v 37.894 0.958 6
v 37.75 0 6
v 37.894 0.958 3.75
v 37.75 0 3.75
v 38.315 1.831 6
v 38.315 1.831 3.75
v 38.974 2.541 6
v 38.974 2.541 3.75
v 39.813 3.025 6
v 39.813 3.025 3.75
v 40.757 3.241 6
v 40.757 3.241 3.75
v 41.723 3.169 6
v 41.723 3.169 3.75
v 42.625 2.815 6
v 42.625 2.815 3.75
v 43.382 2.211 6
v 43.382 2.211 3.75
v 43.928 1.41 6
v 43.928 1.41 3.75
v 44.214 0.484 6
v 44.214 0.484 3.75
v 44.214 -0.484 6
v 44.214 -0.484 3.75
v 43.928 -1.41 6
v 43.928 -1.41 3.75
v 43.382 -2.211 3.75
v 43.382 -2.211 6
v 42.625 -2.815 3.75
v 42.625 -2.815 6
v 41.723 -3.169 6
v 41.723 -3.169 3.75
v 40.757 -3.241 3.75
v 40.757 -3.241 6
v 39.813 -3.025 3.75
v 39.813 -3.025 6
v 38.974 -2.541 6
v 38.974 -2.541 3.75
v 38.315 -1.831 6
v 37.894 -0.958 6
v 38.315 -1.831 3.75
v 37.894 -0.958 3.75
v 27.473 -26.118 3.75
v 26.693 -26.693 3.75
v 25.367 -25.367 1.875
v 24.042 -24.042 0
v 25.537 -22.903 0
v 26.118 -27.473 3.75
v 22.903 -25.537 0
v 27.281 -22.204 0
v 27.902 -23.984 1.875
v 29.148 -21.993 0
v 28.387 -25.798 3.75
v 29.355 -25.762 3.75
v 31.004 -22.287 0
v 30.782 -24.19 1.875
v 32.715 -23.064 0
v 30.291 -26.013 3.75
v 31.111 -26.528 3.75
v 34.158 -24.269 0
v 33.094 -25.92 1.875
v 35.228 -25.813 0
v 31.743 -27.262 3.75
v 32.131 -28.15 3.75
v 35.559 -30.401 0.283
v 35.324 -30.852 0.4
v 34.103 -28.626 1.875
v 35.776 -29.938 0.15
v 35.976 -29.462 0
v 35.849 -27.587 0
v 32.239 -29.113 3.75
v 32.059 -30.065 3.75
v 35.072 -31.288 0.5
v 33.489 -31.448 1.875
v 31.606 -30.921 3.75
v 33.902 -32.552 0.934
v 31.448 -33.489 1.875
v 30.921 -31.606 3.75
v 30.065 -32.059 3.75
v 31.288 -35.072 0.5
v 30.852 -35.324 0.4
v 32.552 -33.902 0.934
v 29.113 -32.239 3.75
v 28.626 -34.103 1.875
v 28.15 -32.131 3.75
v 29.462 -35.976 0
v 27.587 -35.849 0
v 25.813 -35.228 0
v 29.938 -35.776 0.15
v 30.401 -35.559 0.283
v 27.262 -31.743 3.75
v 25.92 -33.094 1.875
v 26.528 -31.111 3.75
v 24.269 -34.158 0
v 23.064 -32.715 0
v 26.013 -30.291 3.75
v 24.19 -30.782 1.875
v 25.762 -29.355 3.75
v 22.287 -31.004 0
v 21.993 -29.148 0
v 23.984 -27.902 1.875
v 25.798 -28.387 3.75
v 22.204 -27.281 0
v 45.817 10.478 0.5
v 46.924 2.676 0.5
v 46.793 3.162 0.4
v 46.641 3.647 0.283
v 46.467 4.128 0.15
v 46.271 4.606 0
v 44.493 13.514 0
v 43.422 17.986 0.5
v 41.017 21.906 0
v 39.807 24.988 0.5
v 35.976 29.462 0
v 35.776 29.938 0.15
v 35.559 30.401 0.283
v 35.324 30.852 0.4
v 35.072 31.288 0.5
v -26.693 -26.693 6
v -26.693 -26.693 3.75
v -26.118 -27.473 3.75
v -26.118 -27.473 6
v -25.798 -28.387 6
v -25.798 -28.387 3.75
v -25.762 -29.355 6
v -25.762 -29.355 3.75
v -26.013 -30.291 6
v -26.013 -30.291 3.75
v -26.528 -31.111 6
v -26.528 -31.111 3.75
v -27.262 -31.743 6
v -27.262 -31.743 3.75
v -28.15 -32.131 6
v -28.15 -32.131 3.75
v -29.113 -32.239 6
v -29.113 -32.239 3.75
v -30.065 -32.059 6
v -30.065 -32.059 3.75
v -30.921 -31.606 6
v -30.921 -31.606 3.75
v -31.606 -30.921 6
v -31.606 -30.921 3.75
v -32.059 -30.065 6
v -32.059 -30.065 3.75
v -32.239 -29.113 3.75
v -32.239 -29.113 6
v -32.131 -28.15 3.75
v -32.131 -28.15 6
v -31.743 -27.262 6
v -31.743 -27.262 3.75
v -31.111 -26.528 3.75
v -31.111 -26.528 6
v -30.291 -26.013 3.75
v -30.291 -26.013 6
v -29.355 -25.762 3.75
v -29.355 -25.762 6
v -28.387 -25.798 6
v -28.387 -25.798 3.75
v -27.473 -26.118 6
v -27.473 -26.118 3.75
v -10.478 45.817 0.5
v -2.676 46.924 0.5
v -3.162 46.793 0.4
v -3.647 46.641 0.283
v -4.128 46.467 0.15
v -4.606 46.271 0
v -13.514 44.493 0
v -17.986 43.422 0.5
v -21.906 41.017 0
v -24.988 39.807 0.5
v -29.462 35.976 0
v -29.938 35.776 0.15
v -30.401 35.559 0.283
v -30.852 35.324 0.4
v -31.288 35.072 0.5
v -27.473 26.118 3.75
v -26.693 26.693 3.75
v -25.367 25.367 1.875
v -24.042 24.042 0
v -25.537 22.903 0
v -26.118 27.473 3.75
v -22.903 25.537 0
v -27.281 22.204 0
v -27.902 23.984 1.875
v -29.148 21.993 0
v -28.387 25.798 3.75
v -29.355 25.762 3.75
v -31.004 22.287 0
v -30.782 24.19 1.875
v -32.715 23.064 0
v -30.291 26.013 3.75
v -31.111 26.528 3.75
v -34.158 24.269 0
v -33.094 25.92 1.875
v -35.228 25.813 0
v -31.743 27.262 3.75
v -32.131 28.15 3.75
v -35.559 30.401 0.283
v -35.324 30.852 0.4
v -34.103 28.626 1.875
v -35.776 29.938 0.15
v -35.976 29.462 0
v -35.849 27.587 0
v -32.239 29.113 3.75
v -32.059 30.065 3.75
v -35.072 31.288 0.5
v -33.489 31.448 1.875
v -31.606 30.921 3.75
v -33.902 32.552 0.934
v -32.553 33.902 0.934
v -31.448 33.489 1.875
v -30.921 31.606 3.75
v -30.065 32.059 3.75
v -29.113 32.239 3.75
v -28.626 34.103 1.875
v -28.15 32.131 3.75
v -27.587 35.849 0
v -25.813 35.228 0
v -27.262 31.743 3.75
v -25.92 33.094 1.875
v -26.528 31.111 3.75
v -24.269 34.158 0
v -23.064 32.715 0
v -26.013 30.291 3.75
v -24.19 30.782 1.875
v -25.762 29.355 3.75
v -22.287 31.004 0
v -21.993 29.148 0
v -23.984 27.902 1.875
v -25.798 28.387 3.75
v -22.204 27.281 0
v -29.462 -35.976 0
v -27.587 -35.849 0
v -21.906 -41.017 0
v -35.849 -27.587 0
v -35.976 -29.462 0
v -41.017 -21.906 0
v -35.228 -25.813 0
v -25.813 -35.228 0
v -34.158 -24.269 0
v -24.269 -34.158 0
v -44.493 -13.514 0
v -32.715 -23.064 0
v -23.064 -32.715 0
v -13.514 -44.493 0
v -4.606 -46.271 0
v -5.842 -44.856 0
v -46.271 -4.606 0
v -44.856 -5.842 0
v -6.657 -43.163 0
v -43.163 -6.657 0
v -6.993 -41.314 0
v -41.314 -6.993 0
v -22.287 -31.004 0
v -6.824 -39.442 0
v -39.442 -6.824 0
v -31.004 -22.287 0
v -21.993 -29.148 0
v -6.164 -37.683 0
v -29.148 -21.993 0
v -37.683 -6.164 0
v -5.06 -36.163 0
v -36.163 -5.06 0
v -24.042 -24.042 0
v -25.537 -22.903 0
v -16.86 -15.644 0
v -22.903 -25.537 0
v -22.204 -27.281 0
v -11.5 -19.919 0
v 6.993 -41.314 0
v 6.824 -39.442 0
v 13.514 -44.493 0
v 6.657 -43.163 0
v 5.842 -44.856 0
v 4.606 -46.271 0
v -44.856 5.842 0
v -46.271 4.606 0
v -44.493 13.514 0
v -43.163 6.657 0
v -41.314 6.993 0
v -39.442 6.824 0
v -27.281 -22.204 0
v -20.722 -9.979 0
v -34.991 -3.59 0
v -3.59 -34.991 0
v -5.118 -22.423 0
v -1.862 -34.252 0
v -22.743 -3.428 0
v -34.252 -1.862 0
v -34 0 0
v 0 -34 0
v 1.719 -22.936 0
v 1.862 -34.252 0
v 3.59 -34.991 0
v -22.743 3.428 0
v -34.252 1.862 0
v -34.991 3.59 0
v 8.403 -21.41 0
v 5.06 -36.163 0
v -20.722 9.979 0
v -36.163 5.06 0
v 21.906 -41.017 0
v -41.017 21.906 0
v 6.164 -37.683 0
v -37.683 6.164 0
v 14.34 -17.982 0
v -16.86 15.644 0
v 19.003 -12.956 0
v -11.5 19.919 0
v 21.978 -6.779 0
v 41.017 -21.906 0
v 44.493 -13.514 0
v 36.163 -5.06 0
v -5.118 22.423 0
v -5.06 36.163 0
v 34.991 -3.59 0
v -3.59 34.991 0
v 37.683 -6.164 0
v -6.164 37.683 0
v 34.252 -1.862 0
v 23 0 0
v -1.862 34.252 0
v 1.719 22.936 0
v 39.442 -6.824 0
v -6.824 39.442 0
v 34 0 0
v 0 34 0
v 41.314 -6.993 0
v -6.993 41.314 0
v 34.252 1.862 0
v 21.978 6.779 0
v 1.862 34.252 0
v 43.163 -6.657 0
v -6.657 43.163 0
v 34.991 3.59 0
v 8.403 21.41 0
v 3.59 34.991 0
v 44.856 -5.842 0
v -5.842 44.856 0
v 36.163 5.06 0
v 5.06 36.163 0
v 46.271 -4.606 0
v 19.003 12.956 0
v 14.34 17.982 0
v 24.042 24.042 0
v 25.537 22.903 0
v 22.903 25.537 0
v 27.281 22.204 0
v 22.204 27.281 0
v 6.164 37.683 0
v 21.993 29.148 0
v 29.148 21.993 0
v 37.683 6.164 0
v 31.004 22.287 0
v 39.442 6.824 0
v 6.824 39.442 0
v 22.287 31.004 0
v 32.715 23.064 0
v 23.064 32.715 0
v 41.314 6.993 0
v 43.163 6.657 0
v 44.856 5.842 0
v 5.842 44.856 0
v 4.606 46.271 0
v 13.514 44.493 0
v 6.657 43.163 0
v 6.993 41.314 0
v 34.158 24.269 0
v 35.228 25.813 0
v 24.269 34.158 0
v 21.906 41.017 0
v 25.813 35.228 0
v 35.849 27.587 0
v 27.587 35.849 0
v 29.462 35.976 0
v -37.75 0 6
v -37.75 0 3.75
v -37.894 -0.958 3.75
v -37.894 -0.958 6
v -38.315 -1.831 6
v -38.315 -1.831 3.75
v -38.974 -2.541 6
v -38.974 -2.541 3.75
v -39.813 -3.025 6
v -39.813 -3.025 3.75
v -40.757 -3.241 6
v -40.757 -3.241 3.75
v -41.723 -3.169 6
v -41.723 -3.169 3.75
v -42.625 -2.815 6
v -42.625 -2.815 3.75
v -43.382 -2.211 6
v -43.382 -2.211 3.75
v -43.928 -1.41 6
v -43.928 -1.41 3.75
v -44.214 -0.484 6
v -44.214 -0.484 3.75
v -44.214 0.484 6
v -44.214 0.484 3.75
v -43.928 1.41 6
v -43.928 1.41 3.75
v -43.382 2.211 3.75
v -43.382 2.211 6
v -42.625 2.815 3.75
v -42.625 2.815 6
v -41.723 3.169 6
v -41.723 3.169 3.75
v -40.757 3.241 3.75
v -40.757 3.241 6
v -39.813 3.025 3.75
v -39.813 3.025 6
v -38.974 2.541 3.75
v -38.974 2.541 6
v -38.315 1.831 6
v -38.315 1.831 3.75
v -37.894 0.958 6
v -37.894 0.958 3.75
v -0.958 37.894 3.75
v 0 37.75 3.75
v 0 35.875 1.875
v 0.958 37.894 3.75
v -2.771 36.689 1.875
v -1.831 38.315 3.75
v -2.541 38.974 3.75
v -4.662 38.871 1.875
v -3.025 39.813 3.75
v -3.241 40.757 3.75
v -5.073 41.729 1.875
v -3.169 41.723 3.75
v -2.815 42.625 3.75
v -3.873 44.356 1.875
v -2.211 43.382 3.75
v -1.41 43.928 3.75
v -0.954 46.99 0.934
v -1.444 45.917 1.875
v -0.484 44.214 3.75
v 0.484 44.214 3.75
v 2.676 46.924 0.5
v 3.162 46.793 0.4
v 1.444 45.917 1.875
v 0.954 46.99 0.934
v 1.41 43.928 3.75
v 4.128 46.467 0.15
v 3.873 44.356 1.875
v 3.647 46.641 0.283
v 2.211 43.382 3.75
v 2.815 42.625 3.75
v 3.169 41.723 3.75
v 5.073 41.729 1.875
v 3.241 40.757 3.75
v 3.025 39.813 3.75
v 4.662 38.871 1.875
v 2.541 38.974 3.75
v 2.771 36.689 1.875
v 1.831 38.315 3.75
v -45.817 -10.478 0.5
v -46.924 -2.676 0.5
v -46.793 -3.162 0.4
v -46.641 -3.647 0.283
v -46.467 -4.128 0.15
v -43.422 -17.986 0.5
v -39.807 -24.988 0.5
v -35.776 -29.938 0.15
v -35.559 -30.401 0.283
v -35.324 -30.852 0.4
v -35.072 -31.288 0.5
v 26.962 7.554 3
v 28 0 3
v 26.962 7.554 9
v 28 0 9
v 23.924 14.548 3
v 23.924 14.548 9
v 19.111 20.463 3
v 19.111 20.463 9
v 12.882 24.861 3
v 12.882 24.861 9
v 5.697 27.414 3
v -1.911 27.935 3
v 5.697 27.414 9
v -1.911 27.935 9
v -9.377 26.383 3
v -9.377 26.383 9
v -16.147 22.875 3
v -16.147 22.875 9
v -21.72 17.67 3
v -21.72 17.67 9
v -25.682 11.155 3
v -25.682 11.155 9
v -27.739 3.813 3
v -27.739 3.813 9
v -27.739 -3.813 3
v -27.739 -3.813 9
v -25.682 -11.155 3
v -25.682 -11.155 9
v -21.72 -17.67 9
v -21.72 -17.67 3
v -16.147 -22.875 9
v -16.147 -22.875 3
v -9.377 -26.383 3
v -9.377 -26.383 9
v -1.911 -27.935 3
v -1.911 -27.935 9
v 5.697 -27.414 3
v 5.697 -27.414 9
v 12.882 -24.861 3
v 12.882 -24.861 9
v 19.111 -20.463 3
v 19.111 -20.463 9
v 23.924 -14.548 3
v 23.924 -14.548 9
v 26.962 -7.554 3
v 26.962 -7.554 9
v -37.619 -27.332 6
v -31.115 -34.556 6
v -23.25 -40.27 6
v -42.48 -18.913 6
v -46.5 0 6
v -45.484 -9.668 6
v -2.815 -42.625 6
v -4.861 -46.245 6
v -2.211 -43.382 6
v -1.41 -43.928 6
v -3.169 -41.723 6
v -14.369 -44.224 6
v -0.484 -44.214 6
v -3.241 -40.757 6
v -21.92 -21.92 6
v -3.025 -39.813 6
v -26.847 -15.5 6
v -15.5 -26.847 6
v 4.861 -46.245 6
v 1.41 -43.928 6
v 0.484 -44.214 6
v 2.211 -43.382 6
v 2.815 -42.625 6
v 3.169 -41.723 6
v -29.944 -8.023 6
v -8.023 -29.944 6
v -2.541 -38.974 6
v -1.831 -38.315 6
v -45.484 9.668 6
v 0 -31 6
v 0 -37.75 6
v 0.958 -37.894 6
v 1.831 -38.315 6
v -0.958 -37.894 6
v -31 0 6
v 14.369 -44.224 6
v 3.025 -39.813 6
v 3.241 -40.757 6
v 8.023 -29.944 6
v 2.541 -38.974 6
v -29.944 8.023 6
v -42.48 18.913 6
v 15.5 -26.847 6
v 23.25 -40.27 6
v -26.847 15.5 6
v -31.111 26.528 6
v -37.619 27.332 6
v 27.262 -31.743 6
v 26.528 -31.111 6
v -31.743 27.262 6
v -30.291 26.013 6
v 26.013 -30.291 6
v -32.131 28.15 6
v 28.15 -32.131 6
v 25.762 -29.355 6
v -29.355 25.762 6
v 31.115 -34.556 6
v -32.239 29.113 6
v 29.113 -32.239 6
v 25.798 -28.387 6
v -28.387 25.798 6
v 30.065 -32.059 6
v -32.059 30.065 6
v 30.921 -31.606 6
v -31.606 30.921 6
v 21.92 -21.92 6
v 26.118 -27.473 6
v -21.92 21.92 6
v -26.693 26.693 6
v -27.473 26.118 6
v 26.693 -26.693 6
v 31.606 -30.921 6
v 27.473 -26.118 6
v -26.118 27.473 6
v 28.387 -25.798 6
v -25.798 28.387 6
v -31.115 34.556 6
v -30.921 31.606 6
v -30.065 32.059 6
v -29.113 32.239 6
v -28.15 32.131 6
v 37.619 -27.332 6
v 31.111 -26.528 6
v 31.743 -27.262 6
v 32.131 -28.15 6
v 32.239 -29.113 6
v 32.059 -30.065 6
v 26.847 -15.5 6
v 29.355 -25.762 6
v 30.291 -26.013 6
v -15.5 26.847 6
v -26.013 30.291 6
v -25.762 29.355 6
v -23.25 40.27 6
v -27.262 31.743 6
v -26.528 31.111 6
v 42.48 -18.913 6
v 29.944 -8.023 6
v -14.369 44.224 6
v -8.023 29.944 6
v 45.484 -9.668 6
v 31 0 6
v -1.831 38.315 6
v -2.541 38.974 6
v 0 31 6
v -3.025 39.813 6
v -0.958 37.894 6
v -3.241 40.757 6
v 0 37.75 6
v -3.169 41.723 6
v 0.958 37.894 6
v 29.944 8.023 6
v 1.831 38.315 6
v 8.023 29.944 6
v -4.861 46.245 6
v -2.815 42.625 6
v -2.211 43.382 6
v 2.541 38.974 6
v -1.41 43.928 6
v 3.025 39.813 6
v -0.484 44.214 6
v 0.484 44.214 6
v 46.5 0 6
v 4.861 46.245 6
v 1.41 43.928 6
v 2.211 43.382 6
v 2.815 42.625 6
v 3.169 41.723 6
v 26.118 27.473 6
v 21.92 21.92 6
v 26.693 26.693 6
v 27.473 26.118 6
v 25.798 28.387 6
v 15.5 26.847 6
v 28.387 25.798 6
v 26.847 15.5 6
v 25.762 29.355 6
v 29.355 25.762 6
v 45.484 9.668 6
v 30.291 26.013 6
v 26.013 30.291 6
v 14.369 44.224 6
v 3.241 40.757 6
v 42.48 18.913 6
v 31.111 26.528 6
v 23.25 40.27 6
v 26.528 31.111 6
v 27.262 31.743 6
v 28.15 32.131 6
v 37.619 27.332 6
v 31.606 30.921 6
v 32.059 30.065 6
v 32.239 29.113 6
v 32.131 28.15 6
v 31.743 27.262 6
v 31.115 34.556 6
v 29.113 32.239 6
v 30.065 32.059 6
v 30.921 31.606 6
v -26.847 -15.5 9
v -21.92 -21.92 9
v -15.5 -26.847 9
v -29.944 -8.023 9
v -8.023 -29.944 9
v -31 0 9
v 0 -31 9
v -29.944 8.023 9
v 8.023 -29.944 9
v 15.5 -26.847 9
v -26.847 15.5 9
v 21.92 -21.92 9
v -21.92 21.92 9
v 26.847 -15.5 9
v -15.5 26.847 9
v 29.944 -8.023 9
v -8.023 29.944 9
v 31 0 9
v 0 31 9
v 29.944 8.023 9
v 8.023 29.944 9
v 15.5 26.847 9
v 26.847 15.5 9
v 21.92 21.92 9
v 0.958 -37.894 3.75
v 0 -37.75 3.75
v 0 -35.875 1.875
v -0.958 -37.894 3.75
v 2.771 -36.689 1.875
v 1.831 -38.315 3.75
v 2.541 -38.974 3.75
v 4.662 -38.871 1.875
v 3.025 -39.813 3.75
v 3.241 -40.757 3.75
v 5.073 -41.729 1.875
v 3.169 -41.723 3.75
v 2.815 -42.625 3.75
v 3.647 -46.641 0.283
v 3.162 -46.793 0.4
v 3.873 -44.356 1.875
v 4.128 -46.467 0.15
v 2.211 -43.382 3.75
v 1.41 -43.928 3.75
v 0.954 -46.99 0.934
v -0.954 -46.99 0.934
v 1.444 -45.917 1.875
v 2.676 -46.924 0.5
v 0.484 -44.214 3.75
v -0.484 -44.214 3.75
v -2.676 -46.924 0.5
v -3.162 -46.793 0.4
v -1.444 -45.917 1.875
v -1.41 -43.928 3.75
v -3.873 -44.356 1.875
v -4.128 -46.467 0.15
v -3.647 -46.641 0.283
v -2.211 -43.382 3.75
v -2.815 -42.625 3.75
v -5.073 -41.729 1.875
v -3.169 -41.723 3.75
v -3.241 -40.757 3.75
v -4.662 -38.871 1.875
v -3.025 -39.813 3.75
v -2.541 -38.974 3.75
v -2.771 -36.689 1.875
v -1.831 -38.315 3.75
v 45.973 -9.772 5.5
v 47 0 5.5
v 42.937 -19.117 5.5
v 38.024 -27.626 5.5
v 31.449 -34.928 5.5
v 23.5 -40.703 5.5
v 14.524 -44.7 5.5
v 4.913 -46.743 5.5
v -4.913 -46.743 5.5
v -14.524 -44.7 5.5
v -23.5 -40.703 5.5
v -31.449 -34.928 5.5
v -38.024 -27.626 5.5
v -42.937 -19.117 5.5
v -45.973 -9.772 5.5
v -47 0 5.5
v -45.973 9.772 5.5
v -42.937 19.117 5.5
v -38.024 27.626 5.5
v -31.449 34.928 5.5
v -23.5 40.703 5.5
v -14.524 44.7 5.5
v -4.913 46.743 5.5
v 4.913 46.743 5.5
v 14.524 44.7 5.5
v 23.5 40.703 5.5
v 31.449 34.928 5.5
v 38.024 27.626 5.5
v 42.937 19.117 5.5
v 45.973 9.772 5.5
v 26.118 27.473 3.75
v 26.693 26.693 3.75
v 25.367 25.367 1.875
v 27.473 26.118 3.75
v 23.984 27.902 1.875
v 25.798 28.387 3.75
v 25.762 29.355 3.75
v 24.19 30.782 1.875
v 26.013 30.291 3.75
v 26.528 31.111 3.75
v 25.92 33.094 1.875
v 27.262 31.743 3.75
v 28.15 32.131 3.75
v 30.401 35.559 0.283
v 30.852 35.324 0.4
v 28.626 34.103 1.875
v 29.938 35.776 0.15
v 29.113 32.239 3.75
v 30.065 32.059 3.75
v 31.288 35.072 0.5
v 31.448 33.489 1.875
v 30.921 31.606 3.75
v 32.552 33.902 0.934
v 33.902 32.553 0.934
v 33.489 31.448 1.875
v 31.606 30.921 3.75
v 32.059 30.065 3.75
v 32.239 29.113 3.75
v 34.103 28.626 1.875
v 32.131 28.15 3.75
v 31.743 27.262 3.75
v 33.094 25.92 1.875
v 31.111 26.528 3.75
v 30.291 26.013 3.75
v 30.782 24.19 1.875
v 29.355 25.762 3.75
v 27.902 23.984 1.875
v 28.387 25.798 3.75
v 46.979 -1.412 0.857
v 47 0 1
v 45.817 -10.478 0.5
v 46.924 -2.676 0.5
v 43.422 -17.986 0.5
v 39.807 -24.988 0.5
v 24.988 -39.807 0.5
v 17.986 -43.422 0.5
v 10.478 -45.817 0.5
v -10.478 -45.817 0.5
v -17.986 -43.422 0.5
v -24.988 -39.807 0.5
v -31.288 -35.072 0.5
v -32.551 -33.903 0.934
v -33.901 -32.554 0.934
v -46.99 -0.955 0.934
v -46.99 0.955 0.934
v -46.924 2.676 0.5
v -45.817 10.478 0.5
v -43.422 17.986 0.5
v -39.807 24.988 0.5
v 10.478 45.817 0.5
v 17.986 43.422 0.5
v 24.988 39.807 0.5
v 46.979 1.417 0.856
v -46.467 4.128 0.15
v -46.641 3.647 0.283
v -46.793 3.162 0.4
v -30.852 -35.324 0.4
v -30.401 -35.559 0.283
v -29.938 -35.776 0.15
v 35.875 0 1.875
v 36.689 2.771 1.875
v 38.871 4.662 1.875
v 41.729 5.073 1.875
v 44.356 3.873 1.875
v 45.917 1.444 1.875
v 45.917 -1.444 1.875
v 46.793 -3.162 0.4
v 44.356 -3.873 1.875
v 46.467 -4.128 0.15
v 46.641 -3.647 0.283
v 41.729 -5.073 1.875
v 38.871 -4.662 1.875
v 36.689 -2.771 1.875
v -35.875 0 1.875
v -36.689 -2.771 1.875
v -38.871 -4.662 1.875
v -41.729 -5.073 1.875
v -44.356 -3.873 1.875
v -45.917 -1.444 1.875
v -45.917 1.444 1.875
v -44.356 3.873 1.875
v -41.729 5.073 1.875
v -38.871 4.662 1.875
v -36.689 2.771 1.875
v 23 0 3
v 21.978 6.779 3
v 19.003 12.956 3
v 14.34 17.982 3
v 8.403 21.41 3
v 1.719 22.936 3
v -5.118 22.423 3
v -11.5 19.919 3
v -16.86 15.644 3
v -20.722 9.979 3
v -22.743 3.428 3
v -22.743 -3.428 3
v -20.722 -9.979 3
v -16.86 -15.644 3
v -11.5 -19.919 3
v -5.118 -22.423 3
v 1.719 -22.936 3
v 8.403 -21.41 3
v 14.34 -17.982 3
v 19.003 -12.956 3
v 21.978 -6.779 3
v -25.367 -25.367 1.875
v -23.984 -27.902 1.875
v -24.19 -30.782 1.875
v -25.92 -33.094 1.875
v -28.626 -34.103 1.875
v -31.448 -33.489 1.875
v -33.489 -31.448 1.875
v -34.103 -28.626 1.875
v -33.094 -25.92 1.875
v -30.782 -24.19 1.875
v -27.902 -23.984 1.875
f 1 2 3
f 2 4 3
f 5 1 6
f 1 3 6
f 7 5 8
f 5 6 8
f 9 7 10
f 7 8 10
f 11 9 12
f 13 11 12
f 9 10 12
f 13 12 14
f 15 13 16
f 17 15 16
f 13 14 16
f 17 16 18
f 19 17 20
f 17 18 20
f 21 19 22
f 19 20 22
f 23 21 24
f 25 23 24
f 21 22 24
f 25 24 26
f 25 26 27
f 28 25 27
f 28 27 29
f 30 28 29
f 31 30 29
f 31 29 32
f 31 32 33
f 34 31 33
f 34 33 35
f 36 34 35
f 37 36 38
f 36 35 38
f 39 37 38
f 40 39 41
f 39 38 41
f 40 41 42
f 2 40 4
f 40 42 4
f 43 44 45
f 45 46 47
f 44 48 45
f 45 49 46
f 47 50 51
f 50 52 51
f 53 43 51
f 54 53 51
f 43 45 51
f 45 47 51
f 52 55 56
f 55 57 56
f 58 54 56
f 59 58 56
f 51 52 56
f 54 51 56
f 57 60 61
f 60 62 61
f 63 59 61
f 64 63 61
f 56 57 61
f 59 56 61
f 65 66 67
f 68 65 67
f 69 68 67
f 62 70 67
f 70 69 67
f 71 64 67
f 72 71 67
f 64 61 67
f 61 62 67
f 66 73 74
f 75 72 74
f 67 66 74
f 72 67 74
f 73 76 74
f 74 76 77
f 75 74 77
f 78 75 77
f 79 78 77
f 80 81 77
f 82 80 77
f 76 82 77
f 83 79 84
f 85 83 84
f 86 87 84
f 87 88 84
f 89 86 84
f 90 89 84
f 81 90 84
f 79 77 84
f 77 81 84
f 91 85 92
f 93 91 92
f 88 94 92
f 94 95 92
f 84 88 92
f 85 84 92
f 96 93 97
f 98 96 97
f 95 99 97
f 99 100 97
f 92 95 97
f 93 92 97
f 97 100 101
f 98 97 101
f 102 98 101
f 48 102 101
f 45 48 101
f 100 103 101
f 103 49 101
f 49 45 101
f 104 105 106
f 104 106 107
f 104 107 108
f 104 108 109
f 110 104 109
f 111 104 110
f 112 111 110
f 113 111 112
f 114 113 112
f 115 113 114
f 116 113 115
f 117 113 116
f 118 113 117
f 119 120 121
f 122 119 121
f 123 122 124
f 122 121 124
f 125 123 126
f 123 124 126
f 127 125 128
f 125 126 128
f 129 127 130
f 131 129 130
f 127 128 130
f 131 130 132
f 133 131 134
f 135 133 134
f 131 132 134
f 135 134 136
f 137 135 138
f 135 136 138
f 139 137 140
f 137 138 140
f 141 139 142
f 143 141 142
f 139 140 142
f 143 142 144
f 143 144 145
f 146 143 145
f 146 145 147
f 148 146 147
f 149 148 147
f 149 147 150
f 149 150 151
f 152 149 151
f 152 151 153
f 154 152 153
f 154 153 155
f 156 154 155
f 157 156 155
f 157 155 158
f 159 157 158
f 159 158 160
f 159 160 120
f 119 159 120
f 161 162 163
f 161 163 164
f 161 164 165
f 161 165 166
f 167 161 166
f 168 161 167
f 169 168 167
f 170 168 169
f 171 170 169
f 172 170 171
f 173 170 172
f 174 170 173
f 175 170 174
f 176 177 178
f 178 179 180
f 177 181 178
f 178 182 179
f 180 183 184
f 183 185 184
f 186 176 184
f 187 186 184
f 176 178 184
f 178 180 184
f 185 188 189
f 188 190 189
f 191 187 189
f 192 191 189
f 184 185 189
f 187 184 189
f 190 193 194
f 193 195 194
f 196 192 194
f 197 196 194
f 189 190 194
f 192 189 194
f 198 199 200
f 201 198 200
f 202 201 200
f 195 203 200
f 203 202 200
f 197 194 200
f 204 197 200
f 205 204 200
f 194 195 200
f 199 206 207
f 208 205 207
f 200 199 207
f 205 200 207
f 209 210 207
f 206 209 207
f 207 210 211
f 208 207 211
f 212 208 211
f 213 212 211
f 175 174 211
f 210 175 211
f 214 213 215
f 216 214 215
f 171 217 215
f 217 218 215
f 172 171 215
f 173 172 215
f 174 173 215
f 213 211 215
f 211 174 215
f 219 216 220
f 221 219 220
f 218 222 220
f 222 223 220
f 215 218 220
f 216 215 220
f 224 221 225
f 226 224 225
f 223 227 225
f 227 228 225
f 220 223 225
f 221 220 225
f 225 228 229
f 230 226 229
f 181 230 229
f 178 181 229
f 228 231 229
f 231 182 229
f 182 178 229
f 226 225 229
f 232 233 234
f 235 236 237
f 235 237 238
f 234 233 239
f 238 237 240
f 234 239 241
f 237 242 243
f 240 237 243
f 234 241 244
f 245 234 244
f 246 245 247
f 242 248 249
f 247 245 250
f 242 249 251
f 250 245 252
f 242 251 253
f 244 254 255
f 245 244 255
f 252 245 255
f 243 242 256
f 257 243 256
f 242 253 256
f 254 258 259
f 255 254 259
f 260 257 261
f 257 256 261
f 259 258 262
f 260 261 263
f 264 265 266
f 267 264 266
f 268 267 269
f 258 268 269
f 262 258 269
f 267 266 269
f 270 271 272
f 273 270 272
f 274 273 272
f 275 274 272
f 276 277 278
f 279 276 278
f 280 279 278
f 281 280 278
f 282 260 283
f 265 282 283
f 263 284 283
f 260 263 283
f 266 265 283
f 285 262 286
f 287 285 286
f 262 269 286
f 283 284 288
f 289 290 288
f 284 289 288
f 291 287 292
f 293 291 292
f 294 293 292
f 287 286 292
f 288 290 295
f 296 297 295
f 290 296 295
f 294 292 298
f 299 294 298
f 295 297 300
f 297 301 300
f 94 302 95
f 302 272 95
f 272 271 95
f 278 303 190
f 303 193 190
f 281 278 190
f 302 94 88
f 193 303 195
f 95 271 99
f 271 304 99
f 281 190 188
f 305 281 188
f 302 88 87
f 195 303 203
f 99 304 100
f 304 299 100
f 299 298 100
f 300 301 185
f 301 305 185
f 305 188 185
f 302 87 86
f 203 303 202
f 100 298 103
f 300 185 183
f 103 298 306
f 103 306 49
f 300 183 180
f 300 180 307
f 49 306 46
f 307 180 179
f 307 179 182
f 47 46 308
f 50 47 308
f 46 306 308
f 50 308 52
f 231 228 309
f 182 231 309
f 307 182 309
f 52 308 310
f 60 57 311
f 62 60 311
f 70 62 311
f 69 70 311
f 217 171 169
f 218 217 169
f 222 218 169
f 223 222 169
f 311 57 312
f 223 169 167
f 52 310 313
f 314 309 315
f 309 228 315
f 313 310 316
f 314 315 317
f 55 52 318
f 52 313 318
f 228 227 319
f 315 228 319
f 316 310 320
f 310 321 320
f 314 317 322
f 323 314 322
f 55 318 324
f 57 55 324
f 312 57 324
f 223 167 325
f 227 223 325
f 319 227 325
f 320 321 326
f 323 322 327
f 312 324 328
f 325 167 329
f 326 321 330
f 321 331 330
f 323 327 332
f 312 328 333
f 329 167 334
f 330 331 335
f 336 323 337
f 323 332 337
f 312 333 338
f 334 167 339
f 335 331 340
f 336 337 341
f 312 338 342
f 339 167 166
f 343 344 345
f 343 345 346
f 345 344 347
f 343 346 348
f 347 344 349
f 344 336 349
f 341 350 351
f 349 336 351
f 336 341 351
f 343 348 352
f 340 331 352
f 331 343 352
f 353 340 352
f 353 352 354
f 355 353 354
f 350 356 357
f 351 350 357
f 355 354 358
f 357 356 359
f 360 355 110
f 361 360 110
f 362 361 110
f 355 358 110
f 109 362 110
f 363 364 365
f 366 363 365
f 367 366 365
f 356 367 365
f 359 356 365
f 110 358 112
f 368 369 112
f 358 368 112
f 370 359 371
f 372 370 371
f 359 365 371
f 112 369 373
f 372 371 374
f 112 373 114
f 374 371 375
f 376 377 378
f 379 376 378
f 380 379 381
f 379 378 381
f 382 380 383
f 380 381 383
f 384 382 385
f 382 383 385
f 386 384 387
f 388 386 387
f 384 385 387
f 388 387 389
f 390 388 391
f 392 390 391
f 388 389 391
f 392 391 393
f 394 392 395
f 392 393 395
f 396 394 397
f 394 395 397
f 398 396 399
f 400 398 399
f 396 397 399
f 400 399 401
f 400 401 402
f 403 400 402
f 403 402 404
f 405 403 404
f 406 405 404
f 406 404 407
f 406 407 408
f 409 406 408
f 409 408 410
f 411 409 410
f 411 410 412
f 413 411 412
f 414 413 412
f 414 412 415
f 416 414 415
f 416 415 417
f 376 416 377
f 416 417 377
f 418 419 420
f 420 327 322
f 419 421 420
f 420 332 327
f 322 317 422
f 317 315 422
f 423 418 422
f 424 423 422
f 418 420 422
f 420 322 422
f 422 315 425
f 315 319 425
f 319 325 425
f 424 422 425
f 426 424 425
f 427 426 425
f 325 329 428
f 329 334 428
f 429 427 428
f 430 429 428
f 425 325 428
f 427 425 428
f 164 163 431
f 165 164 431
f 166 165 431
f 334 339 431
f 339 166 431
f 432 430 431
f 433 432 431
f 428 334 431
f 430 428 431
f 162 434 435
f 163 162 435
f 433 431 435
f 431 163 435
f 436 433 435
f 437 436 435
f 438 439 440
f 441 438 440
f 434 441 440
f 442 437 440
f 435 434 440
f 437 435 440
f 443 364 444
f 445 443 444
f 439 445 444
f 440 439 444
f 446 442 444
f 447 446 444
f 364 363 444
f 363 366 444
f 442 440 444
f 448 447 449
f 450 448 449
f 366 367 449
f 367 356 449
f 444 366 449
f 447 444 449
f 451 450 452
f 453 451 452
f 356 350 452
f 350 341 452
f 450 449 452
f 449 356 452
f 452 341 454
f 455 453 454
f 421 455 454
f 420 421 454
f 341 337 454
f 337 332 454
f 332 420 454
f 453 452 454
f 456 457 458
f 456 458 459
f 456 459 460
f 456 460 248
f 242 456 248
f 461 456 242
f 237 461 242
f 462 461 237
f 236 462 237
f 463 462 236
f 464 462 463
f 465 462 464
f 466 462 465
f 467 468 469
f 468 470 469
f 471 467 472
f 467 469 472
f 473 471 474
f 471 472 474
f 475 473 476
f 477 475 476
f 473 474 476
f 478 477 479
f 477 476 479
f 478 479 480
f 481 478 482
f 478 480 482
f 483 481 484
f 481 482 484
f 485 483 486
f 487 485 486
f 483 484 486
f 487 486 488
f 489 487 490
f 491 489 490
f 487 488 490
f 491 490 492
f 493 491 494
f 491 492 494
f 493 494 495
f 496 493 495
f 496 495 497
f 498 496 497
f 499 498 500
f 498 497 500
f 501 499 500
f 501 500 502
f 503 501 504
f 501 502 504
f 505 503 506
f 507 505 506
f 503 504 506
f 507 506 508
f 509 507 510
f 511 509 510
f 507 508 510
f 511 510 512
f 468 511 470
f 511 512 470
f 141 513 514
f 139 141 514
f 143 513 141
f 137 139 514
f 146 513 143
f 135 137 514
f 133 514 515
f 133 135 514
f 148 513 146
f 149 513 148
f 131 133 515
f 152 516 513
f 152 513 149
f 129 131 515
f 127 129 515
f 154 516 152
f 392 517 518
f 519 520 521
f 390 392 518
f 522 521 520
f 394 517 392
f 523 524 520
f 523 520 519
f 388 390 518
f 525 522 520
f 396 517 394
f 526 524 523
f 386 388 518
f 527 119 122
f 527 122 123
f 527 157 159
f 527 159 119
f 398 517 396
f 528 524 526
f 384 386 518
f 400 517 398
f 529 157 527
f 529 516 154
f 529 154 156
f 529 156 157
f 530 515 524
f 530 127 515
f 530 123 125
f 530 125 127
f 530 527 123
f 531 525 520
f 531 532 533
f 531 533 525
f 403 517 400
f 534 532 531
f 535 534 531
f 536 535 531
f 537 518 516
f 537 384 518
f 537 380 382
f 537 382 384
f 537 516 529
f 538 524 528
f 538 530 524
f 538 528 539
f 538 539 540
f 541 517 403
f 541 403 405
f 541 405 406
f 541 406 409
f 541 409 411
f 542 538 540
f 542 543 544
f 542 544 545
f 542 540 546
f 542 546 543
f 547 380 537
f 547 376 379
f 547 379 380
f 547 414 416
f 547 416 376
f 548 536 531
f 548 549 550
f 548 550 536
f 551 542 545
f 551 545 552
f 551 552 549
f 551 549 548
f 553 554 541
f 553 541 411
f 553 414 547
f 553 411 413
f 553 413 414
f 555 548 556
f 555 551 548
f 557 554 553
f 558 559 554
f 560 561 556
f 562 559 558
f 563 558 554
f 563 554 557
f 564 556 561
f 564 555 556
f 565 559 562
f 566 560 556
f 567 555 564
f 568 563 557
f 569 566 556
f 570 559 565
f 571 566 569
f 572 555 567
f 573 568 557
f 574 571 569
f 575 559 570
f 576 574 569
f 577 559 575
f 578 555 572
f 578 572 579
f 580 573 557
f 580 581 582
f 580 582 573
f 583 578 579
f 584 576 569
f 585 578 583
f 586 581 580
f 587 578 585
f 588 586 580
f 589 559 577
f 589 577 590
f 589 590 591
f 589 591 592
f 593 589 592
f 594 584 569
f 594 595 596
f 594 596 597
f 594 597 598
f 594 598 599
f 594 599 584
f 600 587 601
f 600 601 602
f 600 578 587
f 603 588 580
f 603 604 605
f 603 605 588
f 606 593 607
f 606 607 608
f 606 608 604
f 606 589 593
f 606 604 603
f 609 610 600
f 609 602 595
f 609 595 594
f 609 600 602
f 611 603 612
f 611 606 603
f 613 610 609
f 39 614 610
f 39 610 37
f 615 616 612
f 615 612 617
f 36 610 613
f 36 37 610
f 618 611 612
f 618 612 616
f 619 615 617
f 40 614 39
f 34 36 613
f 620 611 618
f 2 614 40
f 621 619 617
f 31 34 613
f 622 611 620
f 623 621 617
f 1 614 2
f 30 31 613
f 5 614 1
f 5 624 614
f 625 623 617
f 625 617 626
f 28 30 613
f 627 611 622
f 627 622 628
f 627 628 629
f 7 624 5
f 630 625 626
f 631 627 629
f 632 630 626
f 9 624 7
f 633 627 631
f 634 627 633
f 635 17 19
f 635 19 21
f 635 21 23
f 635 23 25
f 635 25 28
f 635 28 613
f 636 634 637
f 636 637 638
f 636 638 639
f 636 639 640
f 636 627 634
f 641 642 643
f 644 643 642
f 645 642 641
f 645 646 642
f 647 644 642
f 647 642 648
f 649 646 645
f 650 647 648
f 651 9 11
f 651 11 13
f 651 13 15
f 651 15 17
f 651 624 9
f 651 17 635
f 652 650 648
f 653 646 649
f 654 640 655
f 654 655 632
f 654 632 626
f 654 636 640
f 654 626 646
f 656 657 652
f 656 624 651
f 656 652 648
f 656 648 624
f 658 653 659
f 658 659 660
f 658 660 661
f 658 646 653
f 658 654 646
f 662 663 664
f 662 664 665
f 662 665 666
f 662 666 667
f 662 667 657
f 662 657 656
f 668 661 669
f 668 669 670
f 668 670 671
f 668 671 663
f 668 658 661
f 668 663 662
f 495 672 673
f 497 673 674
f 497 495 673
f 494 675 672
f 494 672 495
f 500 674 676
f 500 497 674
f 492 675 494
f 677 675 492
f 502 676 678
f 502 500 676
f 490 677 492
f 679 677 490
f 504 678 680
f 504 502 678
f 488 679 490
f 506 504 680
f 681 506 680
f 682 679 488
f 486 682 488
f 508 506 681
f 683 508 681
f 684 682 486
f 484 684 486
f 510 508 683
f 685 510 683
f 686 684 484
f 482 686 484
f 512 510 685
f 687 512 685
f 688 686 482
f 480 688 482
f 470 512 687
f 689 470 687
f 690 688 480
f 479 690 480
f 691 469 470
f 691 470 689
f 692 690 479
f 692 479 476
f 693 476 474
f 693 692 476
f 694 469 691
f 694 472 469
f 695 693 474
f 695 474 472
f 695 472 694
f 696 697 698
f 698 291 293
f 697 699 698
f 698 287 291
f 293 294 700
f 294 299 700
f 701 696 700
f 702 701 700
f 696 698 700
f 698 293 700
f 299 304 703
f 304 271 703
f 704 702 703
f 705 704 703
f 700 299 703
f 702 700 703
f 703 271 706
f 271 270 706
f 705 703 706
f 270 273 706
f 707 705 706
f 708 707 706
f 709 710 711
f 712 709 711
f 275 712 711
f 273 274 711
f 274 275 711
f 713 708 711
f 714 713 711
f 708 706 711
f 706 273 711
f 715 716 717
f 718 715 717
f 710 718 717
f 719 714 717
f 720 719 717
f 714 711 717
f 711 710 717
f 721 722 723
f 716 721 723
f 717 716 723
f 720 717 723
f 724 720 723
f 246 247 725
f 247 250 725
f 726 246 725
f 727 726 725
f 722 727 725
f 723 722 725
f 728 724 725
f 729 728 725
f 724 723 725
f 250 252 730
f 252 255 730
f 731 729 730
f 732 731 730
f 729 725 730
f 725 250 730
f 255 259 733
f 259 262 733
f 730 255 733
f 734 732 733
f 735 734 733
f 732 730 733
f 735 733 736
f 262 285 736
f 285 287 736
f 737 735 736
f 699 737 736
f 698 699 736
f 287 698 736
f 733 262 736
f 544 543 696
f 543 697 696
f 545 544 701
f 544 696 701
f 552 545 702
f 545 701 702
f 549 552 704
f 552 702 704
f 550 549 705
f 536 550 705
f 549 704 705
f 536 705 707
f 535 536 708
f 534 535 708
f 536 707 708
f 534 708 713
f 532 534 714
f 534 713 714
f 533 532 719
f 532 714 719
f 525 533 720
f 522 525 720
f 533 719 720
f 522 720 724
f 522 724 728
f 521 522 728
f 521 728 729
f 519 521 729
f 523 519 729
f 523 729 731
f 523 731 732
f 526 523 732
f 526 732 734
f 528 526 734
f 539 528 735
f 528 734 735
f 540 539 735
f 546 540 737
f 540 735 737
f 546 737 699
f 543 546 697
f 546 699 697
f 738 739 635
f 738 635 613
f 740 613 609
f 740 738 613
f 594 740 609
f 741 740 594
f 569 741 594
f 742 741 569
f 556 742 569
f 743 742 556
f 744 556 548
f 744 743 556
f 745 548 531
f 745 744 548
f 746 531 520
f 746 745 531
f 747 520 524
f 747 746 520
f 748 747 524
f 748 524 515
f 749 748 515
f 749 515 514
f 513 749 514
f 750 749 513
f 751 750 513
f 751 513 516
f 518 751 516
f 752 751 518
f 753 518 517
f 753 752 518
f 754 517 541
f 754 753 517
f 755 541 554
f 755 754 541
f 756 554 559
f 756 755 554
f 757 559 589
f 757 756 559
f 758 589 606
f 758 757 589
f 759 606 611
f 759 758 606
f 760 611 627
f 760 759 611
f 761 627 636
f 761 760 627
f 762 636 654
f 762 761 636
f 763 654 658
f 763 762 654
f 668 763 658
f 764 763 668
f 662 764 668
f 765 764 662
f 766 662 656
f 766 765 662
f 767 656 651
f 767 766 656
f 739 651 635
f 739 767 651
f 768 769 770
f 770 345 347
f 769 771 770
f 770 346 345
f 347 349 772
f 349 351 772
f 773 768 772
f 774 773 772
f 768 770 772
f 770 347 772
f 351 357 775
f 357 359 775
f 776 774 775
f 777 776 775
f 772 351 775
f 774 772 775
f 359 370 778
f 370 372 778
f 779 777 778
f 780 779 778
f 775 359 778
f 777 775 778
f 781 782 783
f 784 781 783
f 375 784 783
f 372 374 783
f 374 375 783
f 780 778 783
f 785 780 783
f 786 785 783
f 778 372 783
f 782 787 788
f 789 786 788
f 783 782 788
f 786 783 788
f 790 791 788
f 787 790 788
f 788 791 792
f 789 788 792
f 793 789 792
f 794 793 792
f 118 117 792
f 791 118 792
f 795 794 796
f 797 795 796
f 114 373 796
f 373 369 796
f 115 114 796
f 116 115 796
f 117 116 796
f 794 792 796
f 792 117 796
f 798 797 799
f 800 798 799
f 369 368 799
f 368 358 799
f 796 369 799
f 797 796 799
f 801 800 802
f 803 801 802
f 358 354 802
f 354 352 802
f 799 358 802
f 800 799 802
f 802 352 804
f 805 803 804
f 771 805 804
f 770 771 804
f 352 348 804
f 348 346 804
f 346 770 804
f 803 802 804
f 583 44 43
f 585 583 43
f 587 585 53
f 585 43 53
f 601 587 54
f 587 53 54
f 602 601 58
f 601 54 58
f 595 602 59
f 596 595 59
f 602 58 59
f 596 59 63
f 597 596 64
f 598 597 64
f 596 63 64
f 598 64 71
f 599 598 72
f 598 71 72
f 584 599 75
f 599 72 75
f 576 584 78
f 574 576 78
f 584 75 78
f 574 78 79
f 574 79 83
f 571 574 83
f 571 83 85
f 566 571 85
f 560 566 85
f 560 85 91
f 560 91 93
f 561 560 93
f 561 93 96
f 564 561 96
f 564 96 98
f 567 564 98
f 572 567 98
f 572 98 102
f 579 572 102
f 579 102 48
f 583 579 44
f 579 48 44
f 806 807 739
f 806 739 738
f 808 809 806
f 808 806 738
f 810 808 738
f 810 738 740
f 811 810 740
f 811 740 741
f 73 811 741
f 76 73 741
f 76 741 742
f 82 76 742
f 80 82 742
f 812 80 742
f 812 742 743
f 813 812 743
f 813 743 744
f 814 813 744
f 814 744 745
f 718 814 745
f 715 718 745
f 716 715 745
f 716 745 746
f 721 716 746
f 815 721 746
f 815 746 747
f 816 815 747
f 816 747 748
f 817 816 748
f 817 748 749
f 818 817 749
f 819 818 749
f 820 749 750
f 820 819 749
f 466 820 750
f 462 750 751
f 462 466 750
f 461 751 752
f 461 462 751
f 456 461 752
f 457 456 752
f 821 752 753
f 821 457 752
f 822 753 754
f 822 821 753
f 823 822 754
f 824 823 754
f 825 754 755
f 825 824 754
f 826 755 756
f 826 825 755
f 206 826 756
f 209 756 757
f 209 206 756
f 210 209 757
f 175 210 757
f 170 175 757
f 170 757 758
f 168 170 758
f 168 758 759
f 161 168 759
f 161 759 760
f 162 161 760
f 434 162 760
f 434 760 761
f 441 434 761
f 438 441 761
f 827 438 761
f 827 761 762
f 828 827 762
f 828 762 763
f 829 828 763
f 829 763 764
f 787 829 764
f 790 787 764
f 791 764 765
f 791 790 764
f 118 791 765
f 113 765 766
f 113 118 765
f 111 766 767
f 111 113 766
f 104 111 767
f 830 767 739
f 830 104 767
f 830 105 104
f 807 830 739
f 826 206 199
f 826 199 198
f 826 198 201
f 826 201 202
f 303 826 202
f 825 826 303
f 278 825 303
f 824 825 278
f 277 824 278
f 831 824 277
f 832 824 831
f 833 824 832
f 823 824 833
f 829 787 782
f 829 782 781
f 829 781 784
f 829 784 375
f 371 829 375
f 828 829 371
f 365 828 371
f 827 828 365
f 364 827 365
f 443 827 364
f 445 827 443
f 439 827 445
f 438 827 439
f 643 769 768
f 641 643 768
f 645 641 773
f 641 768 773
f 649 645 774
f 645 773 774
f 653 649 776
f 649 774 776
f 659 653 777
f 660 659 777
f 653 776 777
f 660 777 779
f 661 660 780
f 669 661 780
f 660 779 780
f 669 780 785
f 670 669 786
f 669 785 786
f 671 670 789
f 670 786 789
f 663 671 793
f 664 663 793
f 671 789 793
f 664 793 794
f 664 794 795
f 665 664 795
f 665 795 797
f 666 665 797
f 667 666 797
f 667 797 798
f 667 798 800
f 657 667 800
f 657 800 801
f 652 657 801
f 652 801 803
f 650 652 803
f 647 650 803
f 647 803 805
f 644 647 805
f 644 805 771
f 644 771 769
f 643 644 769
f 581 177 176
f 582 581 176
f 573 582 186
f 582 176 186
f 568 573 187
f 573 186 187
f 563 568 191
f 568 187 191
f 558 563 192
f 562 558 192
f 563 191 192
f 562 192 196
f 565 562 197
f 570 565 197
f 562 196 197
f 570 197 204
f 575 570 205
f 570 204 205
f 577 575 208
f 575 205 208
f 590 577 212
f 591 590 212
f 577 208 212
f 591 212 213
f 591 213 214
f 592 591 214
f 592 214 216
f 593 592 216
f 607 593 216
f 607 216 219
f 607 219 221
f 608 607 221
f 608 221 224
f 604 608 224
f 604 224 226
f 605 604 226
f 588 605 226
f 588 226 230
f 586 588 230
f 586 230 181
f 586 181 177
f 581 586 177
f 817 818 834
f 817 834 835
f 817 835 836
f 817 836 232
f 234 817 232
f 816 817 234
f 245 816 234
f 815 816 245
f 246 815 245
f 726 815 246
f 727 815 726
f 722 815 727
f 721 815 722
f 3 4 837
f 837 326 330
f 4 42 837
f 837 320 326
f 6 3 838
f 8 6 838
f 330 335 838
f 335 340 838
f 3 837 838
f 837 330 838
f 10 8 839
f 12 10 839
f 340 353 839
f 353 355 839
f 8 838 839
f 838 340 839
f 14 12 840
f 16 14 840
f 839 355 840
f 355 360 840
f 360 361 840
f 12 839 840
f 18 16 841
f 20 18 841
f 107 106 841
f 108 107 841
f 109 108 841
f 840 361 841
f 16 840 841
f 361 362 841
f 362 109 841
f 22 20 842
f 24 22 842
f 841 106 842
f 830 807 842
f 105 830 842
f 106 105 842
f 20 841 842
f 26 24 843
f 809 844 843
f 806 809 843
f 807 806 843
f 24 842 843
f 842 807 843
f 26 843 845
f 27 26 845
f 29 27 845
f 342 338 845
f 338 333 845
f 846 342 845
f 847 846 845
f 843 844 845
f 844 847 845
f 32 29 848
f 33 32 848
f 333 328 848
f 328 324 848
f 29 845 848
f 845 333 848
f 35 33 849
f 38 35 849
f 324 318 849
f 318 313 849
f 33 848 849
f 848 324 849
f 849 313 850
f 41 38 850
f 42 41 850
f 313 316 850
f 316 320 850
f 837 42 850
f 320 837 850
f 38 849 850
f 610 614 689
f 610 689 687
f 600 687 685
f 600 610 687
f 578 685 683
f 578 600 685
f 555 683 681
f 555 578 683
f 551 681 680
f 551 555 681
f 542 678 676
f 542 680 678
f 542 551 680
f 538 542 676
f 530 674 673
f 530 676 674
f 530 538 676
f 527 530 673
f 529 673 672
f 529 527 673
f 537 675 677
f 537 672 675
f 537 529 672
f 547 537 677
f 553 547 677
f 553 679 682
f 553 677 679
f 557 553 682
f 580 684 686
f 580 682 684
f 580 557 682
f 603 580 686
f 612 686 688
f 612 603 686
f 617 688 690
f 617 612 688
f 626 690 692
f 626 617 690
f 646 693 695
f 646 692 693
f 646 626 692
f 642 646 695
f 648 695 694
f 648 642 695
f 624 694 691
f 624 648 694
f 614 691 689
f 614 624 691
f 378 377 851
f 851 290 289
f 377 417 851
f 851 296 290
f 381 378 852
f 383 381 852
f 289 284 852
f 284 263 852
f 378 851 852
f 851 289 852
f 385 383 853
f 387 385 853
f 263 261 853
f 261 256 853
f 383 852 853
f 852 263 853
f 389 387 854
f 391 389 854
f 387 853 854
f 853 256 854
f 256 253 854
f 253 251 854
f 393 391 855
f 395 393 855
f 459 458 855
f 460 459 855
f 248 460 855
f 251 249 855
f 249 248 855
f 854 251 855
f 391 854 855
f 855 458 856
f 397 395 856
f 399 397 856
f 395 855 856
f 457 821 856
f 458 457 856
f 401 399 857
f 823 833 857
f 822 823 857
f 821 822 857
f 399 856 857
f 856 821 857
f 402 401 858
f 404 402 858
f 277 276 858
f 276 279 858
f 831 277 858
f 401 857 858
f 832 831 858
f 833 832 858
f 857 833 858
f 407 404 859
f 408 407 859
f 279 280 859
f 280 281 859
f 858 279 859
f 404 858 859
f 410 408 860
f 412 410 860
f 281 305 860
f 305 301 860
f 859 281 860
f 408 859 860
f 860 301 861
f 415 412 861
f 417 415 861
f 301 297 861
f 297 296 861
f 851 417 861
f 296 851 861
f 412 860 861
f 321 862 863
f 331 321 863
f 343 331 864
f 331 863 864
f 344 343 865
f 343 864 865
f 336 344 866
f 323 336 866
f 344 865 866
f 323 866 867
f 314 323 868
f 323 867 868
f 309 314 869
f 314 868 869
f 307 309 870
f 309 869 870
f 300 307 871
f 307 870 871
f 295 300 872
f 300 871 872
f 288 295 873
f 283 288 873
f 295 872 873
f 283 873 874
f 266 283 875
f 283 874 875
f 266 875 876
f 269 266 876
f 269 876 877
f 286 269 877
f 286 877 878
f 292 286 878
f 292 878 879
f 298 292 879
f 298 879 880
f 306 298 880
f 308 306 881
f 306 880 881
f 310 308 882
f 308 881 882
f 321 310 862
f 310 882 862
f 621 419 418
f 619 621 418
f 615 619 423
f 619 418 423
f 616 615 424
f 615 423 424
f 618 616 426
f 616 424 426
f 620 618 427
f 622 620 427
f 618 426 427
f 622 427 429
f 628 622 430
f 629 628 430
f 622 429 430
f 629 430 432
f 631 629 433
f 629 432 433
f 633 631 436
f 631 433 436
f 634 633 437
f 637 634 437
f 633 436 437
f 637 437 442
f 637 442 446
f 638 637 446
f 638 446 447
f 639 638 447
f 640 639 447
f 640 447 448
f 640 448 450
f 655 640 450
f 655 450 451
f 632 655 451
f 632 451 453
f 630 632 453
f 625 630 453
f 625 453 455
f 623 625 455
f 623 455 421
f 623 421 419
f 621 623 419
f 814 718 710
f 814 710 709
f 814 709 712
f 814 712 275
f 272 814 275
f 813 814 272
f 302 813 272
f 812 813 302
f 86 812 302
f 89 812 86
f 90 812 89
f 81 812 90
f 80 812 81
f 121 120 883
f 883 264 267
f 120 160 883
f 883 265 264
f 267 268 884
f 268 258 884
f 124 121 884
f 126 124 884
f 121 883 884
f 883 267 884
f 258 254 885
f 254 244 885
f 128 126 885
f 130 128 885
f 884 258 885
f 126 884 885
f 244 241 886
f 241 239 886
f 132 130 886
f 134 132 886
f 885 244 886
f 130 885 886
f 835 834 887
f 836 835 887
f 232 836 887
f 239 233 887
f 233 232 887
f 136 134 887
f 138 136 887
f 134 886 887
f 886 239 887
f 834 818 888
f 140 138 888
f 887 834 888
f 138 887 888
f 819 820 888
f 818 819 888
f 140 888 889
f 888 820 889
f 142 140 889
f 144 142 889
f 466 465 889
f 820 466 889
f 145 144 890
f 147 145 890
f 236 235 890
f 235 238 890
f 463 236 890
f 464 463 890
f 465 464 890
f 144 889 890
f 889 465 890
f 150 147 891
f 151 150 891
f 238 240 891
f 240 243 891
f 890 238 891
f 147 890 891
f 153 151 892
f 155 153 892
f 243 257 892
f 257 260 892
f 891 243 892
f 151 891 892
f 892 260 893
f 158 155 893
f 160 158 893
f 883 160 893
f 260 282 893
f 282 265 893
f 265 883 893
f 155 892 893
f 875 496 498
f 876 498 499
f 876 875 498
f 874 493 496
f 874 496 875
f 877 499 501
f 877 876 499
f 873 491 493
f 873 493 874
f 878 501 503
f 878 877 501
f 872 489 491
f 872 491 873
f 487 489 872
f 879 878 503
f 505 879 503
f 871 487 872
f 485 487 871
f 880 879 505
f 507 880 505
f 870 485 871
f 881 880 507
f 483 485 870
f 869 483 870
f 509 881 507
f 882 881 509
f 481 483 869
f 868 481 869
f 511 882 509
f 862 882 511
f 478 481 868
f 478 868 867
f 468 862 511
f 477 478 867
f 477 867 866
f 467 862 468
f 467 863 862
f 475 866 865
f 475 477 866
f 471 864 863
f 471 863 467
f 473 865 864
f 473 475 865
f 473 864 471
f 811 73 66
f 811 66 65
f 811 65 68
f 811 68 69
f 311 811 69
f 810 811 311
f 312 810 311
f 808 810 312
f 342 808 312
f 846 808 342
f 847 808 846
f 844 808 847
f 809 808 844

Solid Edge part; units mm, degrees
sketch "Sketch1" plane through (0, 0, 0) normal (0, 0, 1) x (1, 0, 0)
  circle A0 centre (0, 0) radius 47
  dimension "D1" = 94
extrude "Protrusion1" add sketch "Sketch1" along normal blind 6
sketch "Sketch2" plane through (0, 0, 6) normal (0, 0, 1) x (1, 0, 0)
  circle A0 centre (0, 0) radius 31
  dimension "D1" = 62
extrude "ProtrusiónExtruida_2" add sketch "Sketch2" along normal blind 3
sketch "Sketch3" plane through (0, 0, 9) normal (0, 0, 1) x (1, 0, 0)
  circle A0 centre (0, 0) radius 28
  dimension "D1" = 56
extrude "VaciadoExtruido_1" cut sketch "Sketch3" against normal blind 6
sketch "Sketch4" plane through (0, 0, 3) normal (0, 0, 1) x (1, 0, 0)
  circle A0 centre (0, 0) radius 23
  dimension "D1" = 46
extrude "Cutout1" cut sketch "Sketch4" against normal through all
chamfer "Chaflán_1" distance 0.5 angle 45 2 edges at (-47, 0, 0) (-47, 0, 6)
sketch "Sketch5" plane through (0, 0, 0) normal (1, 0, 0) x (0, 1, 0)
  line L0 (-37.75, 6) -> (-37.75, 3.75)
  line L1 (-37.75, 3.75) -> (-34, 0)
  dimension "D1" = 41
  dimension "D2" = 3.25
  dimension "D3" = 3.75
revolve "RevolvedCutout1" cut sketch "Sketch5" angle 360 about axis through (0, -41, 17.975) along (0, 0, -1) material side at (0, -37.8, 4.875)
pattern_circular "Pattern1" count 8 over 360 about axis through (0, 0, 0) along (0, 0, 1) of "RevolvedCutout1"
properties part number "1976-1100-003" material "Aluminio, 7075-T6"
